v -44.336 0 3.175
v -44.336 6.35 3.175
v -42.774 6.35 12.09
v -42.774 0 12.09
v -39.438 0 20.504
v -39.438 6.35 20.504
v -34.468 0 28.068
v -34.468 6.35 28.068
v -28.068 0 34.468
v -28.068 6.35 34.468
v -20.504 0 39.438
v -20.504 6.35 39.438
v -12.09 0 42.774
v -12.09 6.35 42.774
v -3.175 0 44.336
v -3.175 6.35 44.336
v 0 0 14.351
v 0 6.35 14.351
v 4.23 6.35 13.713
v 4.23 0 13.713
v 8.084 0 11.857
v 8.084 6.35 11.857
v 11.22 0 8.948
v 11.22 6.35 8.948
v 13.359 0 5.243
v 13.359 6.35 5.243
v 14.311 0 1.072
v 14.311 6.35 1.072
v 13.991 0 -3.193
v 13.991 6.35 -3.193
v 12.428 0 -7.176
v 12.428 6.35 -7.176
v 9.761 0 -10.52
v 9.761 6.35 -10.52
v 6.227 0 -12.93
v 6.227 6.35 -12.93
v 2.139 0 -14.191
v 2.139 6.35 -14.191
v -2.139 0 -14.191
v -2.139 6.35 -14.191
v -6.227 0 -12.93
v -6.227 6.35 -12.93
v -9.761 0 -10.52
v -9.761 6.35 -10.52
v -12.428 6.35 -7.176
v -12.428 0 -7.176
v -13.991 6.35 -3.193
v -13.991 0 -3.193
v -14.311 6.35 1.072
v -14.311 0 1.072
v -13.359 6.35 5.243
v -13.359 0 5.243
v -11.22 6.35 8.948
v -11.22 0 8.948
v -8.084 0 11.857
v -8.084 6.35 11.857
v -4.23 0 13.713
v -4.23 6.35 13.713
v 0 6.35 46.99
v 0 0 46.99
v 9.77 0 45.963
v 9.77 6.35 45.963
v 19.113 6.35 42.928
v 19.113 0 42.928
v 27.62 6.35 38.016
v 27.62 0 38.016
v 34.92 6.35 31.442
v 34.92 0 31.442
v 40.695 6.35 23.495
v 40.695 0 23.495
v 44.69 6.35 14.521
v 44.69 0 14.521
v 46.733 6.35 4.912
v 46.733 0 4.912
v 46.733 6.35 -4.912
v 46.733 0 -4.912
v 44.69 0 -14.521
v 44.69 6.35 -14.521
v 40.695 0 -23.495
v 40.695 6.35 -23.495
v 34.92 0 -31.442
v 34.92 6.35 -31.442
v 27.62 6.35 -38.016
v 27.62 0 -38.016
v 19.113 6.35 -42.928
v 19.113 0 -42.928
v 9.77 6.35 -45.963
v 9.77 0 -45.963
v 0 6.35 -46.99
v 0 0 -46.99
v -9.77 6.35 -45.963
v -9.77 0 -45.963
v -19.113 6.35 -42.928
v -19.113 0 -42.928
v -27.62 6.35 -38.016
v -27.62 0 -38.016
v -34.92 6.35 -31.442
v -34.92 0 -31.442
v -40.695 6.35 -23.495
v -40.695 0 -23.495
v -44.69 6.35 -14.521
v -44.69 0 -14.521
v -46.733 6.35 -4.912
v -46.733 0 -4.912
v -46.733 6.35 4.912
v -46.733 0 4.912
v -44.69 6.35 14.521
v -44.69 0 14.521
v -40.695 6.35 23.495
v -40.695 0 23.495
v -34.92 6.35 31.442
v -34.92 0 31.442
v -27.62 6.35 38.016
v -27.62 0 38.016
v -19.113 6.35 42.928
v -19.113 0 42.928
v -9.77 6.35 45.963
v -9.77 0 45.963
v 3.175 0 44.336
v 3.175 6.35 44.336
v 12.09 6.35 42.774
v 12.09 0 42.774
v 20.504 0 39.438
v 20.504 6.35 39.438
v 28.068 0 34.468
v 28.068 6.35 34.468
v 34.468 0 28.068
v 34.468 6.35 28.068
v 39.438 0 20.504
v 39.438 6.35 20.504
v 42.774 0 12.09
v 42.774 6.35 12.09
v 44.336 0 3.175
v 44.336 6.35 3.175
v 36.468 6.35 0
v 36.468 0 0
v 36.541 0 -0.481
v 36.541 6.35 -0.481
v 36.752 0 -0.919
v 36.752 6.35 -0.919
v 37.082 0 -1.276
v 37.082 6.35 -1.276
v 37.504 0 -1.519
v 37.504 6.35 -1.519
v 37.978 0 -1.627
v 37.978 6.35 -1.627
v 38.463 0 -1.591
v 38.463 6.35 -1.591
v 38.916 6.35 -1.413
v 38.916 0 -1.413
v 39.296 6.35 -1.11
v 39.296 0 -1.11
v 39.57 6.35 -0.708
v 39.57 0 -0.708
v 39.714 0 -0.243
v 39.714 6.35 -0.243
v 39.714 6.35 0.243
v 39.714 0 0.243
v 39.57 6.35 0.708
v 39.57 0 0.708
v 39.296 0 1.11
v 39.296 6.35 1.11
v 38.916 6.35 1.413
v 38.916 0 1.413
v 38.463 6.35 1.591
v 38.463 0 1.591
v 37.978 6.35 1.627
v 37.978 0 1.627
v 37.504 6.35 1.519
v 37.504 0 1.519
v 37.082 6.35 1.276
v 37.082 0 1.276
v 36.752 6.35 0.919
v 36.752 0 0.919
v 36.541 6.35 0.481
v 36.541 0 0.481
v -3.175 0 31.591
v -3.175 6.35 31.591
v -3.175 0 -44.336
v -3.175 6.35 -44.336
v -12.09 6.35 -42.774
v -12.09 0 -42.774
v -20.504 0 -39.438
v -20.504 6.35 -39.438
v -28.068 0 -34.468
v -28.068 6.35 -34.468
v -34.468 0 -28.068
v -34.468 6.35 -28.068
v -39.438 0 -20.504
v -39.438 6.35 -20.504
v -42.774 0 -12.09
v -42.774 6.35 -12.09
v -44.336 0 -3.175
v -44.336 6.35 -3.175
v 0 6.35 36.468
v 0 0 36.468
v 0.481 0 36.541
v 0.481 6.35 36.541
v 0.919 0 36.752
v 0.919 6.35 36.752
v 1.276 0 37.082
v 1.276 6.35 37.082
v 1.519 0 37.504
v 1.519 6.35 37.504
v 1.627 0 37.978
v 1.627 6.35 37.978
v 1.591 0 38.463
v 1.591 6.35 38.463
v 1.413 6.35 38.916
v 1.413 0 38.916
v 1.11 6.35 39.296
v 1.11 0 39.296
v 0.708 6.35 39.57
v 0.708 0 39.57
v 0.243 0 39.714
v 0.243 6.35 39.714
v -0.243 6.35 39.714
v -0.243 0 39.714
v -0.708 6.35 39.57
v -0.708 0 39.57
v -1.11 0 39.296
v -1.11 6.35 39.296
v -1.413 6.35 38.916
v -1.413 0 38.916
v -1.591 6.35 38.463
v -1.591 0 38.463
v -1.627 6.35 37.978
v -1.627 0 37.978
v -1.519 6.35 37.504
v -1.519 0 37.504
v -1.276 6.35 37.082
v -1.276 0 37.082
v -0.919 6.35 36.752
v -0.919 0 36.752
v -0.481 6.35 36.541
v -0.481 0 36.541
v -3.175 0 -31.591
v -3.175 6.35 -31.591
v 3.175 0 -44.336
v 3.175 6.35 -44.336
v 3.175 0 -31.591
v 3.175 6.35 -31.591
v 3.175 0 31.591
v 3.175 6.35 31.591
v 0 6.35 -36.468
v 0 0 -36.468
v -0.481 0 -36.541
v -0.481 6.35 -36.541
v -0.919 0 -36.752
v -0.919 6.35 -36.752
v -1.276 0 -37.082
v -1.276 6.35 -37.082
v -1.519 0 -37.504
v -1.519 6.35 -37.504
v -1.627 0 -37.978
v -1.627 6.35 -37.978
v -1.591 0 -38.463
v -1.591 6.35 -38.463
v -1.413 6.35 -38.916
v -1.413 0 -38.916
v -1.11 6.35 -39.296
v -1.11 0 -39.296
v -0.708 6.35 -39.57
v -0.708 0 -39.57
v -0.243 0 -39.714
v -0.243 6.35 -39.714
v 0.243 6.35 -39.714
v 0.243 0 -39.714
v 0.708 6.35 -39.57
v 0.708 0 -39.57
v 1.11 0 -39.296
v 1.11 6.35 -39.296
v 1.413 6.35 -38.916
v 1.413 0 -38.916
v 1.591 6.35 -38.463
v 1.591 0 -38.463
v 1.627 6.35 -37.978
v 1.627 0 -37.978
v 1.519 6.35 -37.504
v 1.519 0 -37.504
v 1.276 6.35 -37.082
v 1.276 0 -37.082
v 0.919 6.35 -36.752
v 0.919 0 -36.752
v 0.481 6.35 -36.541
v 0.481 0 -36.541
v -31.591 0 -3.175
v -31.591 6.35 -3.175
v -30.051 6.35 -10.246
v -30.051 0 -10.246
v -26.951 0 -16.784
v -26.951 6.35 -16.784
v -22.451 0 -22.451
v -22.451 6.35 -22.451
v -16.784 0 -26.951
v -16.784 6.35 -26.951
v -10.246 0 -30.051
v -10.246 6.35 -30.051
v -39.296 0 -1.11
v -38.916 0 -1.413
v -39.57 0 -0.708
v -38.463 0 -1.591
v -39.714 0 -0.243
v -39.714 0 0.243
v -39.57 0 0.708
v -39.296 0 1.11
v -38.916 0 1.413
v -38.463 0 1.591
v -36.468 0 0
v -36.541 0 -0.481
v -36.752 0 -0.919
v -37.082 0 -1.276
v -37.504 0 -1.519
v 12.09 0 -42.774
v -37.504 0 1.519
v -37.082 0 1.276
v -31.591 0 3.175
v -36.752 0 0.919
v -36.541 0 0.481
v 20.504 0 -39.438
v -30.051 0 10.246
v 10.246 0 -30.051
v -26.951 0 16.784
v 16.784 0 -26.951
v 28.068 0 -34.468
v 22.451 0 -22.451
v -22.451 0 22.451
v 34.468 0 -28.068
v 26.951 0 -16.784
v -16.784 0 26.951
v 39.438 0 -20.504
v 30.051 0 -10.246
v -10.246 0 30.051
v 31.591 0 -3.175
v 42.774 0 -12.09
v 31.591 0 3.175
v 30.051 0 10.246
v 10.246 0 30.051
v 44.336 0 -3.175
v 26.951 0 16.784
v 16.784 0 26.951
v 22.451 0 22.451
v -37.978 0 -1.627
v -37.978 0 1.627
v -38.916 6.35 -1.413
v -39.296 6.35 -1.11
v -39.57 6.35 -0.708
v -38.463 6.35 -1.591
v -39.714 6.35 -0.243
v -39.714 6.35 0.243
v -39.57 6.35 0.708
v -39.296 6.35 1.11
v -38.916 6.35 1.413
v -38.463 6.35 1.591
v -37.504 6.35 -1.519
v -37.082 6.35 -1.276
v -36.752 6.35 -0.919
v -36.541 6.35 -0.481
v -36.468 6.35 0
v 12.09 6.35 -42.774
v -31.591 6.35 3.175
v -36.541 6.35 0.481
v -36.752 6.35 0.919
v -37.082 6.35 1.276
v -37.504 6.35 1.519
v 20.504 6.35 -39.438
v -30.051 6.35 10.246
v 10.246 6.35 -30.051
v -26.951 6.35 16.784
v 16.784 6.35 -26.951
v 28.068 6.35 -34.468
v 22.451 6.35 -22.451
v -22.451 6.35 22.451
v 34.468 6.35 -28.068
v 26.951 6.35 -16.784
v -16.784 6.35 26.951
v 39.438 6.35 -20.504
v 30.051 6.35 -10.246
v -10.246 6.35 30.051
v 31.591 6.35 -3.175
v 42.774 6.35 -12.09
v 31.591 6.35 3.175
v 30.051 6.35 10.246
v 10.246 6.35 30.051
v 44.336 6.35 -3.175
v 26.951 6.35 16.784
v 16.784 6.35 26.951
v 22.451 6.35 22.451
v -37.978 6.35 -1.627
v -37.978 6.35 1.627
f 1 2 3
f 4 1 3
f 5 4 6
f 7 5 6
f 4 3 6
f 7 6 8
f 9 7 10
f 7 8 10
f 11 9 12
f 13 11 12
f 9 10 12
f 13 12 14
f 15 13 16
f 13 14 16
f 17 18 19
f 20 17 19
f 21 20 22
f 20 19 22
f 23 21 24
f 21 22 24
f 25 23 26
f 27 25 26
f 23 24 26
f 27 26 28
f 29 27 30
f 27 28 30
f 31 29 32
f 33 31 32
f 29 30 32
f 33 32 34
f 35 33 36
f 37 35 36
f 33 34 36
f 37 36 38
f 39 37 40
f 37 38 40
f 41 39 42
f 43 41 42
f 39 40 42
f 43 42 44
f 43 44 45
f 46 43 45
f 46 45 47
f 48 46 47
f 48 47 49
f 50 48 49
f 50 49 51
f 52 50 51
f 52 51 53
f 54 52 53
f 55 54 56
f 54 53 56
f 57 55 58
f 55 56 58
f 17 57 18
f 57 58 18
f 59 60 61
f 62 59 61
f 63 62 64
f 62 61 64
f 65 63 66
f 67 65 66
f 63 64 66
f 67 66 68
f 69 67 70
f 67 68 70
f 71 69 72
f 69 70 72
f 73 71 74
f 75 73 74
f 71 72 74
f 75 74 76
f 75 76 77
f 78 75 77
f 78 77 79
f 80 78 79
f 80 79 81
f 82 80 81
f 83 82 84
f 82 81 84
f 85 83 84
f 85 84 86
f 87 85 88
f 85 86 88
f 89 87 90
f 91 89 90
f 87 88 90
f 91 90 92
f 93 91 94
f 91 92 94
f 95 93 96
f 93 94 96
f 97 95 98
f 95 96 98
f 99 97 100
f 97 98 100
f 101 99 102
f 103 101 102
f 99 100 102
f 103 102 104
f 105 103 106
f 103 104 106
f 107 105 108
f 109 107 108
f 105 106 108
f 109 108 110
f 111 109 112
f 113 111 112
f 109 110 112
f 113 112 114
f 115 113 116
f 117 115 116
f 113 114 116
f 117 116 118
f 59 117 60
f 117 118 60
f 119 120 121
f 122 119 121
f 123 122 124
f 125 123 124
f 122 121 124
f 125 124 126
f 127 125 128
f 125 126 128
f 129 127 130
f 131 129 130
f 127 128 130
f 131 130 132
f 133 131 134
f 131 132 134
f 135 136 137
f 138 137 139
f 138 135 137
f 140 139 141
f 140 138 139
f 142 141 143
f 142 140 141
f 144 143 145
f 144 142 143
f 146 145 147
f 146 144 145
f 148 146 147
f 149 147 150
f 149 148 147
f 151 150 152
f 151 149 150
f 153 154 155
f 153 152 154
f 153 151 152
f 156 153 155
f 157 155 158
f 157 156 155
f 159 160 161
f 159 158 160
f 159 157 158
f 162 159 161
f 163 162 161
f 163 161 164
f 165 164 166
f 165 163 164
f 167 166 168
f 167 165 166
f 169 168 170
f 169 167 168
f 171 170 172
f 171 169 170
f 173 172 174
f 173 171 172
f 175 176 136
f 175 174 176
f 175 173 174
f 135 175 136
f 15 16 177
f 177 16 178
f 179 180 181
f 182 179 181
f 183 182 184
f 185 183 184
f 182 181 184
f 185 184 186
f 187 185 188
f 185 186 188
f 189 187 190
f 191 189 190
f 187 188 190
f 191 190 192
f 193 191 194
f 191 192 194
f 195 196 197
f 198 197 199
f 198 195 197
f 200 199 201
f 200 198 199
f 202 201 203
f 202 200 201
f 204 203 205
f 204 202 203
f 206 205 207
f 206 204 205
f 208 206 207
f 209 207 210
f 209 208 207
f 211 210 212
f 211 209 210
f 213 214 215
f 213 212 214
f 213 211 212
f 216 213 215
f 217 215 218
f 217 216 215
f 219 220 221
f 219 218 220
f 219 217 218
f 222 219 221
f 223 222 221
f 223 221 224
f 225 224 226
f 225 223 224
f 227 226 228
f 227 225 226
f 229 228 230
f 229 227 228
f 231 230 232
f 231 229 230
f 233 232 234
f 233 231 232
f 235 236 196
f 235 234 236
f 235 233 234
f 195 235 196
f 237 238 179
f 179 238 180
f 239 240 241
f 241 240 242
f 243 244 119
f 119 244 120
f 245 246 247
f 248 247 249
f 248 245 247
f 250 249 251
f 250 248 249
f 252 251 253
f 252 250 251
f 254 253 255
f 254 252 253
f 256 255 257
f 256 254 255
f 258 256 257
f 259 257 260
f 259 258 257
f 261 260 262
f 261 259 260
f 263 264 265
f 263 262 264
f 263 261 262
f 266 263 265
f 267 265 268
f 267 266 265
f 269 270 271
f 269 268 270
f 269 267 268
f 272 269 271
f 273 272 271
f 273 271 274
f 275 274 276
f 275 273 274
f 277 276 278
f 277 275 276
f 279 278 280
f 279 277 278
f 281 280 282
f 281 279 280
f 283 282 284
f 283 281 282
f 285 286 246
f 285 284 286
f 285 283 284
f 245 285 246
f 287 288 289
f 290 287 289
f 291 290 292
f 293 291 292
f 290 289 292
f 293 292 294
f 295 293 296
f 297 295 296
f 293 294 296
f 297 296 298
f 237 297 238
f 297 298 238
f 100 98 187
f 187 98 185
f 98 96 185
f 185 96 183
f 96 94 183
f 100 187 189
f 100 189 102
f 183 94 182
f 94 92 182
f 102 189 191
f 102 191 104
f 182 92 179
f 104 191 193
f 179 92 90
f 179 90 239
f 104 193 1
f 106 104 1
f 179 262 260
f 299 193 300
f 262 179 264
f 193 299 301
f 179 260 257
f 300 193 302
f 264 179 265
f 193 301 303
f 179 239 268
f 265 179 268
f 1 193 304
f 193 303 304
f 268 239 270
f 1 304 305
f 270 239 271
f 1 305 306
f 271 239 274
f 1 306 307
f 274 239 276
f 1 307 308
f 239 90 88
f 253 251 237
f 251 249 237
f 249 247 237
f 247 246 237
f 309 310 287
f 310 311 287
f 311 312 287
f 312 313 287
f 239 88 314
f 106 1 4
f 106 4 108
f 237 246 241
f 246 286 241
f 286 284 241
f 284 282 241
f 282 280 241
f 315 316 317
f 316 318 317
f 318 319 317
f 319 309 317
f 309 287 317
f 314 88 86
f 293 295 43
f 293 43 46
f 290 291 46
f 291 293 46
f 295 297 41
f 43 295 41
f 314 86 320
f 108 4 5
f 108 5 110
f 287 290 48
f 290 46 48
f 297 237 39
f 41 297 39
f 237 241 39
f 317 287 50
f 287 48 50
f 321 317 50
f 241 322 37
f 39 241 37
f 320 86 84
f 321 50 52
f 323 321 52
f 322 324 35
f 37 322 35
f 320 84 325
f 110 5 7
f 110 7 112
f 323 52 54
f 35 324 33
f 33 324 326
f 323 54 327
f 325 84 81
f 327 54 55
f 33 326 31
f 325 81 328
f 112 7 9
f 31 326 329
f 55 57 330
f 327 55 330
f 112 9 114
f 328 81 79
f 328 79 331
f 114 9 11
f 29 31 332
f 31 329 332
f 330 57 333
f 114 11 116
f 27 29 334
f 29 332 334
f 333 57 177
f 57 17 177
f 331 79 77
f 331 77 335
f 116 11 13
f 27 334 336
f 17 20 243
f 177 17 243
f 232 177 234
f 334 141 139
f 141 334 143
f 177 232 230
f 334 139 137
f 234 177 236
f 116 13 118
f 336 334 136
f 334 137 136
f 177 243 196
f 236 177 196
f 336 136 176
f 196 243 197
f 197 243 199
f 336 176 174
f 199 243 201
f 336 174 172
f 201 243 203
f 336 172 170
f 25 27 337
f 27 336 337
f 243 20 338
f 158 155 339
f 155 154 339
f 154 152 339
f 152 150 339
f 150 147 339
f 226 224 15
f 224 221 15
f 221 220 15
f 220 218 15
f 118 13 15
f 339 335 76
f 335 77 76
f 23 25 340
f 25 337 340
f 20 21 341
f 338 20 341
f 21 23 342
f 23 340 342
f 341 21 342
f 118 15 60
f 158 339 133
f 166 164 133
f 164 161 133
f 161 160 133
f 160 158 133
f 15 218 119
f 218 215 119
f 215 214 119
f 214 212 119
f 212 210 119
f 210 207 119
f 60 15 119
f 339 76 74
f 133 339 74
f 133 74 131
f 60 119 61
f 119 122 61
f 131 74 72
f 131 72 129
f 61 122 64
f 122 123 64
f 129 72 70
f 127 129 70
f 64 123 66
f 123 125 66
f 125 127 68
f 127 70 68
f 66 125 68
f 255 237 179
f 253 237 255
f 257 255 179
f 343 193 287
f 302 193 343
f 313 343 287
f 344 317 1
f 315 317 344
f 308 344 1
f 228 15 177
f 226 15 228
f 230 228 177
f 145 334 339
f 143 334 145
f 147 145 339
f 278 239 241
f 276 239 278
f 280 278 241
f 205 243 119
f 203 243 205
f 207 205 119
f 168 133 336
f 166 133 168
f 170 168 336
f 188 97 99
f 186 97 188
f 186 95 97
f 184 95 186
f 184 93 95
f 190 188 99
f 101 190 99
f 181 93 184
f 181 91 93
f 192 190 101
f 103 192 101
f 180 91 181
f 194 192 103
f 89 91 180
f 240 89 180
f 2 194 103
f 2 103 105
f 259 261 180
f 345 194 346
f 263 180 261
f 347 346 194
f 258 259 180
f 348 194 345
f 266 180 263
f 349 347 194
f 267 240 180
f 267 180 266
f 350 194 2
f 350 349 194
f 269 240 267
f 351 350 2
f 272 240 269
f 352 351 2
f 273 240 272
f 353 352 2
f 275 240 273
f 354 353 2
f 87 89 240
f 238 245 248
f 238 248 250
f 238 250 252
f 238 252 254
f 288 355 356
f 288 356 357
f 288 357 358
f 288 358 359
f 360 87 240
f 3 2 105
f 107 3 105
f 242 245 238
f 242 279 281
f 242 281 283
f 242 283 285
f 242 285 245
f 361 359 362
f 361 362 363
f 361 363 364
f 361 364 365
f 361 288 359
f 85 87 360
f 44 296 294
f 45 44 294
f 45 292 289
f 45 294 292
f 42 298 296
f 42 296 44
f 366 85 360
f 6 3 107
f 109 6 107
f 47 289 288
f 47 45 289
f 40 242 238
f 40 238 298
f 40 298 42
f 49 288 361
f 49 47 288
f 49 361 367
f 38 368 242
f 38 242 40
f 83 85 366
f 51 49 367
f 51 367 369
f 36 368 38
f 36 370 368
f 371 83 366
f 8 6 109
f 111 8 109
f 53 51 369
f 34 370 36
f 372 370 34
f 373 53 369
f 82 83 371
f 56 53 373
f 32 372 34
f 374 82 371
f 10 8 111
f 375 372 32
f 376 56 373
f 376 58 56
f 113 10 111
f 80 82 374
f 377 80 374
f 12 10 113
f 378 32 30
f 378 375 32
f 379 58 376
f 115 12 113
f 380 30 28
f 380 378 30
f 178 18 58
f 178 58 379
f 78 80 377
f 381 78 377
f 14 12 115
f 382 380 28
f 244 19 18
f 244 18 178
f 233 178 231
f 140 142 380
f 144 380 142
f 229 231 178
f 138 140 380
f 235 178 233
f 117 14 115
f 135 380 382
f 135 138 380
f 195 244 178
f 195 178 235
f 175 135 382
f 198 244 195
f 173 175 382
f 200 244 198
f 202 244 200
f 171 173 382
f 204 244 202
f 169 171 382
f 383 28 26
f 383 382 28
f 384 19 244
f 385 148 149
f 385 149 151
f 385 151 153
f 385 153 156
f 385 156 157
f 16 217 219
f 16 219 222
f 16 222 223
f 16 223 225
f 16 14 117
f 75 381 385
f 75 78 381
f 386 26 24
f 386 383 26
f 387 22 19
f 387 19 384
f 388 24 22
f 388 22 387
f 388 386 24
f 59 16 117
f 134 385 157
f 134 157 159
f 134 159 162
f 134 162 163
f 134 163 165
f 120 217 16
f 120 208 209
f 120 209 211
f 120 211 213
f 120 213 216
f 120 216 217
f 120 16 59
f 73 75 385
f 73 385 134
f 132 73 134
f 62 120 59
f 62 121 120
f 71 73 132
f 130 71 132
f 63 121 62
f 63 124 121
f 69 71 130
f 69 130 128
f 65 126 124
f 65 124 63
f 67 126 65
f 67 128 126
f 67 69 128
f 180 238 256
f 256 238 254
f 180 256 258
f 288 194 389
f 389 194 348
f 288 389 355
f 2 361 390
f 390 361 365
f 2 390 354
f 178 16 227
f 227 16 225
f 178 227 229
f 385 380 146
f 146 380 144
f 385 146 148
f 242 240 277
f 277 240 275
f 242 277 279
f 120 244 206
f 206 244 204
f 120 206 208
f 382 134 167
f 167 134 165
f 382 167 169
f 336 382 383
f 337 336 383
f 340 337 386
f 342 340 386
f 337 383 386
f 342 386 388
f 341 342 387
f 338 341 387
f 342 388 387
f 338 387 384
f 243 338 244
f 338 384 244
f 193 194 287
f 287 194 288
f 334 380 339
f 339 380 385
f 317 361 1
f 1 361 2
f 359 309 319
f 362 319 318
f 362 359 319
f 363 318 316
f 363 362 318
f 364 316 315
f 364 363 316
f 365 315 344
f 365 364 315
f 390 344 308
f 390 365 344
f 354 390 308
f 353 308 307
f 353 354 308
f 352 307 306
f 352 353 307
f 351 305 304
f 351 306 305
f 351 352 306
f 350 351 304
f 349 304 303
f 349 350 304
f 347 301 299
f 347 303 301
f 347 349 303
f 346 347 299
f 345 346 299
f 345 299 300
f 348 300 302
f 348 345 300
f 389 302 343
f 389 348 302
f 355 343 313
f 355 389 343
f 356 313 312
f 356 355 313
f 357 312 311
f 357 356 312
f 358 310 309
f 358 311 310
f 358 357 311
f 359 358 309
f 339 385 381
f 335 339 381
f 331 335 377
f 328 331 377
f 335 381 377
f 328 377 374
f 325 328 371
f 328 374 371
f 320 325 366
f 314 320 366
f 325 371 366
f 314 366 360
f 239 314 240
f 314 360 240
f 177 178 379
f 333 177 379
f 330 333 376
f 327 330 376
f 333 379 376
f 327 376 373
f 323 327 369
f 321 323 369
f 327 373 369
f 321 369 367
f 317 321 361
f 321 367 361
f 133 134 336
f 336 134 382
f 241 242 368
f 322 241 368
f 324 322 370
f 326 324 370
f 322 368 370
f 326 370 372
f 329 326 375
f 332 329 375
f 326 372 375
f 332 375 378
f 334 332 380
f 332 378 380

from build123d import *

# Parameters (mm, degrees)
SKETCH1_R           = 46.99
BOSS_EXTRUDE1_DEPTH = 6.35
SKETCH2_R           = 14.351
CUT_EXTRUDE1_DEPTH  = 6.35
CUT_EXTRUDE2_DEPTH  = 6.35
CIRPATTERN1_COUNT   = 4


with BuildPart() as part:
    # Sketch1 → Boss-Extrude1 (new body)
    with BuildSketch(Plane(origin=(0, 0, 0), x_dir=(1, 0, 0), z_dir=(0, 1, 0))):
        Circle(SKETCH1_R)
    extrude(amount=BOSS_EXTRUDE1_DEPTH)

    # Sketch2 → Cut-Extrude1 (cut)
    with BuildSketch(Plane(origin=(0, 6.35, 0), x_dir=(1, 0, 0), z_dir=(0, 1, 0))):
        Circle(SKETCH2_R)
    extrude(amount=-CUT_EXTRUDE1_DEPTH, mode=Mode.SUBTRACT)

    # Sketch3 → Cut-Extrude2 (cut)
    with BuildSketch(Plane(origin=(0, 6.35, 0), x_dir=(1, 0, 0), z_dir=(0, 1, 0))):
        with BuildLine():
            Line((-3.175, 31.590851128), (-3.175, 44.336462139))
            ThreePointArc((-3.175, 44.336462139), (-31.430896424, 31.430896424), (-44.336462139, 3.175))
            Line((-44.336462139, 3.175), (-31.590851128, 3.175))
            ThreePointArc((-31.590851128, 3.175), (-22.450640303, 22.450640303), (-3.175, 31.590851128))
        make_face()
        with BuildLine():
            ThreePointArc((44.336462139, 3.175), (31.430896424, 31.430896424), (3.175, 44.336462139))
            Line((3.175, 44.336462139), (3.175, 31.590851128))
            ThreePointArc((3.175, 31.590851128), (22.450640303, 22.450640303), (31.590851128, 3.175))
            Line((31.590851128, 3.175), (44.336462139, 3.175))
        make_face()
        with BuildLine():
            Line((-31.590851128, -3.175), (-44.336462139, -3.175))
            ThreePointArc((-44.336462139, -3.175), (-31.430896424, -31.430896424), (-3.175, -44.336462139))
            Line((-3.175, -44.336462139), (-3.175, -31.590851128))
            ThreePointArc((-3.175, -31.590851128), (-22.450640303, -22.450640303), (-31.590851128, -3.175))
        make_face()
        with BuildLine():
            ThreePointArc((3.175, -44.336462139), (31.430896424, -31.430896424), (44.336462139, -3.175))
            Line((44.336462139, -3.175), (31.590851128, -3.175))
            ThreePointArc((31.590851128, -3.175), (22.450640303, -22.450640303), (3.175, -31.590851128))
            Line((3.175, -31.590851128), (3.175, -44.336462139))
        make_face()
    extrude(amount=-CUT_EXTRUDE2_DEPTH, mode=Mode.SUBTRACT)

    # Sketch4 → #4 Clearance Hole1 (revolve, cut)
    with BuildSketch(Plane(origin=(0, 6.35, -38.1), x_dir=(0, 0, 1), z_dir=(1, 0, 0))):
        Polygon((0, 0), (0, 11.140574487), (1.63195, 10.16), (1.63195, 0), align=None)
    f_4_clearance_hole1 = revolve(axis=Axis((0, 12.7, -38.1), (0, -1, 0)), mode=Mode.SUBTRACT)

    # CirPattern1: #4 Clearance Hole1 ×4 about axis
    cirpattern1_axis = Axis((0, 6.35, 0), (0, 1, 0))
    for i in range(1, CIRPATTERN1_COUNT):
        add(f_4_clearance_hole1.rotate(cirpattern1_axis, i * 360 / CIRPATTERN1_COUNT), mode=Mode.SUBTRACT)


solid = part.part
